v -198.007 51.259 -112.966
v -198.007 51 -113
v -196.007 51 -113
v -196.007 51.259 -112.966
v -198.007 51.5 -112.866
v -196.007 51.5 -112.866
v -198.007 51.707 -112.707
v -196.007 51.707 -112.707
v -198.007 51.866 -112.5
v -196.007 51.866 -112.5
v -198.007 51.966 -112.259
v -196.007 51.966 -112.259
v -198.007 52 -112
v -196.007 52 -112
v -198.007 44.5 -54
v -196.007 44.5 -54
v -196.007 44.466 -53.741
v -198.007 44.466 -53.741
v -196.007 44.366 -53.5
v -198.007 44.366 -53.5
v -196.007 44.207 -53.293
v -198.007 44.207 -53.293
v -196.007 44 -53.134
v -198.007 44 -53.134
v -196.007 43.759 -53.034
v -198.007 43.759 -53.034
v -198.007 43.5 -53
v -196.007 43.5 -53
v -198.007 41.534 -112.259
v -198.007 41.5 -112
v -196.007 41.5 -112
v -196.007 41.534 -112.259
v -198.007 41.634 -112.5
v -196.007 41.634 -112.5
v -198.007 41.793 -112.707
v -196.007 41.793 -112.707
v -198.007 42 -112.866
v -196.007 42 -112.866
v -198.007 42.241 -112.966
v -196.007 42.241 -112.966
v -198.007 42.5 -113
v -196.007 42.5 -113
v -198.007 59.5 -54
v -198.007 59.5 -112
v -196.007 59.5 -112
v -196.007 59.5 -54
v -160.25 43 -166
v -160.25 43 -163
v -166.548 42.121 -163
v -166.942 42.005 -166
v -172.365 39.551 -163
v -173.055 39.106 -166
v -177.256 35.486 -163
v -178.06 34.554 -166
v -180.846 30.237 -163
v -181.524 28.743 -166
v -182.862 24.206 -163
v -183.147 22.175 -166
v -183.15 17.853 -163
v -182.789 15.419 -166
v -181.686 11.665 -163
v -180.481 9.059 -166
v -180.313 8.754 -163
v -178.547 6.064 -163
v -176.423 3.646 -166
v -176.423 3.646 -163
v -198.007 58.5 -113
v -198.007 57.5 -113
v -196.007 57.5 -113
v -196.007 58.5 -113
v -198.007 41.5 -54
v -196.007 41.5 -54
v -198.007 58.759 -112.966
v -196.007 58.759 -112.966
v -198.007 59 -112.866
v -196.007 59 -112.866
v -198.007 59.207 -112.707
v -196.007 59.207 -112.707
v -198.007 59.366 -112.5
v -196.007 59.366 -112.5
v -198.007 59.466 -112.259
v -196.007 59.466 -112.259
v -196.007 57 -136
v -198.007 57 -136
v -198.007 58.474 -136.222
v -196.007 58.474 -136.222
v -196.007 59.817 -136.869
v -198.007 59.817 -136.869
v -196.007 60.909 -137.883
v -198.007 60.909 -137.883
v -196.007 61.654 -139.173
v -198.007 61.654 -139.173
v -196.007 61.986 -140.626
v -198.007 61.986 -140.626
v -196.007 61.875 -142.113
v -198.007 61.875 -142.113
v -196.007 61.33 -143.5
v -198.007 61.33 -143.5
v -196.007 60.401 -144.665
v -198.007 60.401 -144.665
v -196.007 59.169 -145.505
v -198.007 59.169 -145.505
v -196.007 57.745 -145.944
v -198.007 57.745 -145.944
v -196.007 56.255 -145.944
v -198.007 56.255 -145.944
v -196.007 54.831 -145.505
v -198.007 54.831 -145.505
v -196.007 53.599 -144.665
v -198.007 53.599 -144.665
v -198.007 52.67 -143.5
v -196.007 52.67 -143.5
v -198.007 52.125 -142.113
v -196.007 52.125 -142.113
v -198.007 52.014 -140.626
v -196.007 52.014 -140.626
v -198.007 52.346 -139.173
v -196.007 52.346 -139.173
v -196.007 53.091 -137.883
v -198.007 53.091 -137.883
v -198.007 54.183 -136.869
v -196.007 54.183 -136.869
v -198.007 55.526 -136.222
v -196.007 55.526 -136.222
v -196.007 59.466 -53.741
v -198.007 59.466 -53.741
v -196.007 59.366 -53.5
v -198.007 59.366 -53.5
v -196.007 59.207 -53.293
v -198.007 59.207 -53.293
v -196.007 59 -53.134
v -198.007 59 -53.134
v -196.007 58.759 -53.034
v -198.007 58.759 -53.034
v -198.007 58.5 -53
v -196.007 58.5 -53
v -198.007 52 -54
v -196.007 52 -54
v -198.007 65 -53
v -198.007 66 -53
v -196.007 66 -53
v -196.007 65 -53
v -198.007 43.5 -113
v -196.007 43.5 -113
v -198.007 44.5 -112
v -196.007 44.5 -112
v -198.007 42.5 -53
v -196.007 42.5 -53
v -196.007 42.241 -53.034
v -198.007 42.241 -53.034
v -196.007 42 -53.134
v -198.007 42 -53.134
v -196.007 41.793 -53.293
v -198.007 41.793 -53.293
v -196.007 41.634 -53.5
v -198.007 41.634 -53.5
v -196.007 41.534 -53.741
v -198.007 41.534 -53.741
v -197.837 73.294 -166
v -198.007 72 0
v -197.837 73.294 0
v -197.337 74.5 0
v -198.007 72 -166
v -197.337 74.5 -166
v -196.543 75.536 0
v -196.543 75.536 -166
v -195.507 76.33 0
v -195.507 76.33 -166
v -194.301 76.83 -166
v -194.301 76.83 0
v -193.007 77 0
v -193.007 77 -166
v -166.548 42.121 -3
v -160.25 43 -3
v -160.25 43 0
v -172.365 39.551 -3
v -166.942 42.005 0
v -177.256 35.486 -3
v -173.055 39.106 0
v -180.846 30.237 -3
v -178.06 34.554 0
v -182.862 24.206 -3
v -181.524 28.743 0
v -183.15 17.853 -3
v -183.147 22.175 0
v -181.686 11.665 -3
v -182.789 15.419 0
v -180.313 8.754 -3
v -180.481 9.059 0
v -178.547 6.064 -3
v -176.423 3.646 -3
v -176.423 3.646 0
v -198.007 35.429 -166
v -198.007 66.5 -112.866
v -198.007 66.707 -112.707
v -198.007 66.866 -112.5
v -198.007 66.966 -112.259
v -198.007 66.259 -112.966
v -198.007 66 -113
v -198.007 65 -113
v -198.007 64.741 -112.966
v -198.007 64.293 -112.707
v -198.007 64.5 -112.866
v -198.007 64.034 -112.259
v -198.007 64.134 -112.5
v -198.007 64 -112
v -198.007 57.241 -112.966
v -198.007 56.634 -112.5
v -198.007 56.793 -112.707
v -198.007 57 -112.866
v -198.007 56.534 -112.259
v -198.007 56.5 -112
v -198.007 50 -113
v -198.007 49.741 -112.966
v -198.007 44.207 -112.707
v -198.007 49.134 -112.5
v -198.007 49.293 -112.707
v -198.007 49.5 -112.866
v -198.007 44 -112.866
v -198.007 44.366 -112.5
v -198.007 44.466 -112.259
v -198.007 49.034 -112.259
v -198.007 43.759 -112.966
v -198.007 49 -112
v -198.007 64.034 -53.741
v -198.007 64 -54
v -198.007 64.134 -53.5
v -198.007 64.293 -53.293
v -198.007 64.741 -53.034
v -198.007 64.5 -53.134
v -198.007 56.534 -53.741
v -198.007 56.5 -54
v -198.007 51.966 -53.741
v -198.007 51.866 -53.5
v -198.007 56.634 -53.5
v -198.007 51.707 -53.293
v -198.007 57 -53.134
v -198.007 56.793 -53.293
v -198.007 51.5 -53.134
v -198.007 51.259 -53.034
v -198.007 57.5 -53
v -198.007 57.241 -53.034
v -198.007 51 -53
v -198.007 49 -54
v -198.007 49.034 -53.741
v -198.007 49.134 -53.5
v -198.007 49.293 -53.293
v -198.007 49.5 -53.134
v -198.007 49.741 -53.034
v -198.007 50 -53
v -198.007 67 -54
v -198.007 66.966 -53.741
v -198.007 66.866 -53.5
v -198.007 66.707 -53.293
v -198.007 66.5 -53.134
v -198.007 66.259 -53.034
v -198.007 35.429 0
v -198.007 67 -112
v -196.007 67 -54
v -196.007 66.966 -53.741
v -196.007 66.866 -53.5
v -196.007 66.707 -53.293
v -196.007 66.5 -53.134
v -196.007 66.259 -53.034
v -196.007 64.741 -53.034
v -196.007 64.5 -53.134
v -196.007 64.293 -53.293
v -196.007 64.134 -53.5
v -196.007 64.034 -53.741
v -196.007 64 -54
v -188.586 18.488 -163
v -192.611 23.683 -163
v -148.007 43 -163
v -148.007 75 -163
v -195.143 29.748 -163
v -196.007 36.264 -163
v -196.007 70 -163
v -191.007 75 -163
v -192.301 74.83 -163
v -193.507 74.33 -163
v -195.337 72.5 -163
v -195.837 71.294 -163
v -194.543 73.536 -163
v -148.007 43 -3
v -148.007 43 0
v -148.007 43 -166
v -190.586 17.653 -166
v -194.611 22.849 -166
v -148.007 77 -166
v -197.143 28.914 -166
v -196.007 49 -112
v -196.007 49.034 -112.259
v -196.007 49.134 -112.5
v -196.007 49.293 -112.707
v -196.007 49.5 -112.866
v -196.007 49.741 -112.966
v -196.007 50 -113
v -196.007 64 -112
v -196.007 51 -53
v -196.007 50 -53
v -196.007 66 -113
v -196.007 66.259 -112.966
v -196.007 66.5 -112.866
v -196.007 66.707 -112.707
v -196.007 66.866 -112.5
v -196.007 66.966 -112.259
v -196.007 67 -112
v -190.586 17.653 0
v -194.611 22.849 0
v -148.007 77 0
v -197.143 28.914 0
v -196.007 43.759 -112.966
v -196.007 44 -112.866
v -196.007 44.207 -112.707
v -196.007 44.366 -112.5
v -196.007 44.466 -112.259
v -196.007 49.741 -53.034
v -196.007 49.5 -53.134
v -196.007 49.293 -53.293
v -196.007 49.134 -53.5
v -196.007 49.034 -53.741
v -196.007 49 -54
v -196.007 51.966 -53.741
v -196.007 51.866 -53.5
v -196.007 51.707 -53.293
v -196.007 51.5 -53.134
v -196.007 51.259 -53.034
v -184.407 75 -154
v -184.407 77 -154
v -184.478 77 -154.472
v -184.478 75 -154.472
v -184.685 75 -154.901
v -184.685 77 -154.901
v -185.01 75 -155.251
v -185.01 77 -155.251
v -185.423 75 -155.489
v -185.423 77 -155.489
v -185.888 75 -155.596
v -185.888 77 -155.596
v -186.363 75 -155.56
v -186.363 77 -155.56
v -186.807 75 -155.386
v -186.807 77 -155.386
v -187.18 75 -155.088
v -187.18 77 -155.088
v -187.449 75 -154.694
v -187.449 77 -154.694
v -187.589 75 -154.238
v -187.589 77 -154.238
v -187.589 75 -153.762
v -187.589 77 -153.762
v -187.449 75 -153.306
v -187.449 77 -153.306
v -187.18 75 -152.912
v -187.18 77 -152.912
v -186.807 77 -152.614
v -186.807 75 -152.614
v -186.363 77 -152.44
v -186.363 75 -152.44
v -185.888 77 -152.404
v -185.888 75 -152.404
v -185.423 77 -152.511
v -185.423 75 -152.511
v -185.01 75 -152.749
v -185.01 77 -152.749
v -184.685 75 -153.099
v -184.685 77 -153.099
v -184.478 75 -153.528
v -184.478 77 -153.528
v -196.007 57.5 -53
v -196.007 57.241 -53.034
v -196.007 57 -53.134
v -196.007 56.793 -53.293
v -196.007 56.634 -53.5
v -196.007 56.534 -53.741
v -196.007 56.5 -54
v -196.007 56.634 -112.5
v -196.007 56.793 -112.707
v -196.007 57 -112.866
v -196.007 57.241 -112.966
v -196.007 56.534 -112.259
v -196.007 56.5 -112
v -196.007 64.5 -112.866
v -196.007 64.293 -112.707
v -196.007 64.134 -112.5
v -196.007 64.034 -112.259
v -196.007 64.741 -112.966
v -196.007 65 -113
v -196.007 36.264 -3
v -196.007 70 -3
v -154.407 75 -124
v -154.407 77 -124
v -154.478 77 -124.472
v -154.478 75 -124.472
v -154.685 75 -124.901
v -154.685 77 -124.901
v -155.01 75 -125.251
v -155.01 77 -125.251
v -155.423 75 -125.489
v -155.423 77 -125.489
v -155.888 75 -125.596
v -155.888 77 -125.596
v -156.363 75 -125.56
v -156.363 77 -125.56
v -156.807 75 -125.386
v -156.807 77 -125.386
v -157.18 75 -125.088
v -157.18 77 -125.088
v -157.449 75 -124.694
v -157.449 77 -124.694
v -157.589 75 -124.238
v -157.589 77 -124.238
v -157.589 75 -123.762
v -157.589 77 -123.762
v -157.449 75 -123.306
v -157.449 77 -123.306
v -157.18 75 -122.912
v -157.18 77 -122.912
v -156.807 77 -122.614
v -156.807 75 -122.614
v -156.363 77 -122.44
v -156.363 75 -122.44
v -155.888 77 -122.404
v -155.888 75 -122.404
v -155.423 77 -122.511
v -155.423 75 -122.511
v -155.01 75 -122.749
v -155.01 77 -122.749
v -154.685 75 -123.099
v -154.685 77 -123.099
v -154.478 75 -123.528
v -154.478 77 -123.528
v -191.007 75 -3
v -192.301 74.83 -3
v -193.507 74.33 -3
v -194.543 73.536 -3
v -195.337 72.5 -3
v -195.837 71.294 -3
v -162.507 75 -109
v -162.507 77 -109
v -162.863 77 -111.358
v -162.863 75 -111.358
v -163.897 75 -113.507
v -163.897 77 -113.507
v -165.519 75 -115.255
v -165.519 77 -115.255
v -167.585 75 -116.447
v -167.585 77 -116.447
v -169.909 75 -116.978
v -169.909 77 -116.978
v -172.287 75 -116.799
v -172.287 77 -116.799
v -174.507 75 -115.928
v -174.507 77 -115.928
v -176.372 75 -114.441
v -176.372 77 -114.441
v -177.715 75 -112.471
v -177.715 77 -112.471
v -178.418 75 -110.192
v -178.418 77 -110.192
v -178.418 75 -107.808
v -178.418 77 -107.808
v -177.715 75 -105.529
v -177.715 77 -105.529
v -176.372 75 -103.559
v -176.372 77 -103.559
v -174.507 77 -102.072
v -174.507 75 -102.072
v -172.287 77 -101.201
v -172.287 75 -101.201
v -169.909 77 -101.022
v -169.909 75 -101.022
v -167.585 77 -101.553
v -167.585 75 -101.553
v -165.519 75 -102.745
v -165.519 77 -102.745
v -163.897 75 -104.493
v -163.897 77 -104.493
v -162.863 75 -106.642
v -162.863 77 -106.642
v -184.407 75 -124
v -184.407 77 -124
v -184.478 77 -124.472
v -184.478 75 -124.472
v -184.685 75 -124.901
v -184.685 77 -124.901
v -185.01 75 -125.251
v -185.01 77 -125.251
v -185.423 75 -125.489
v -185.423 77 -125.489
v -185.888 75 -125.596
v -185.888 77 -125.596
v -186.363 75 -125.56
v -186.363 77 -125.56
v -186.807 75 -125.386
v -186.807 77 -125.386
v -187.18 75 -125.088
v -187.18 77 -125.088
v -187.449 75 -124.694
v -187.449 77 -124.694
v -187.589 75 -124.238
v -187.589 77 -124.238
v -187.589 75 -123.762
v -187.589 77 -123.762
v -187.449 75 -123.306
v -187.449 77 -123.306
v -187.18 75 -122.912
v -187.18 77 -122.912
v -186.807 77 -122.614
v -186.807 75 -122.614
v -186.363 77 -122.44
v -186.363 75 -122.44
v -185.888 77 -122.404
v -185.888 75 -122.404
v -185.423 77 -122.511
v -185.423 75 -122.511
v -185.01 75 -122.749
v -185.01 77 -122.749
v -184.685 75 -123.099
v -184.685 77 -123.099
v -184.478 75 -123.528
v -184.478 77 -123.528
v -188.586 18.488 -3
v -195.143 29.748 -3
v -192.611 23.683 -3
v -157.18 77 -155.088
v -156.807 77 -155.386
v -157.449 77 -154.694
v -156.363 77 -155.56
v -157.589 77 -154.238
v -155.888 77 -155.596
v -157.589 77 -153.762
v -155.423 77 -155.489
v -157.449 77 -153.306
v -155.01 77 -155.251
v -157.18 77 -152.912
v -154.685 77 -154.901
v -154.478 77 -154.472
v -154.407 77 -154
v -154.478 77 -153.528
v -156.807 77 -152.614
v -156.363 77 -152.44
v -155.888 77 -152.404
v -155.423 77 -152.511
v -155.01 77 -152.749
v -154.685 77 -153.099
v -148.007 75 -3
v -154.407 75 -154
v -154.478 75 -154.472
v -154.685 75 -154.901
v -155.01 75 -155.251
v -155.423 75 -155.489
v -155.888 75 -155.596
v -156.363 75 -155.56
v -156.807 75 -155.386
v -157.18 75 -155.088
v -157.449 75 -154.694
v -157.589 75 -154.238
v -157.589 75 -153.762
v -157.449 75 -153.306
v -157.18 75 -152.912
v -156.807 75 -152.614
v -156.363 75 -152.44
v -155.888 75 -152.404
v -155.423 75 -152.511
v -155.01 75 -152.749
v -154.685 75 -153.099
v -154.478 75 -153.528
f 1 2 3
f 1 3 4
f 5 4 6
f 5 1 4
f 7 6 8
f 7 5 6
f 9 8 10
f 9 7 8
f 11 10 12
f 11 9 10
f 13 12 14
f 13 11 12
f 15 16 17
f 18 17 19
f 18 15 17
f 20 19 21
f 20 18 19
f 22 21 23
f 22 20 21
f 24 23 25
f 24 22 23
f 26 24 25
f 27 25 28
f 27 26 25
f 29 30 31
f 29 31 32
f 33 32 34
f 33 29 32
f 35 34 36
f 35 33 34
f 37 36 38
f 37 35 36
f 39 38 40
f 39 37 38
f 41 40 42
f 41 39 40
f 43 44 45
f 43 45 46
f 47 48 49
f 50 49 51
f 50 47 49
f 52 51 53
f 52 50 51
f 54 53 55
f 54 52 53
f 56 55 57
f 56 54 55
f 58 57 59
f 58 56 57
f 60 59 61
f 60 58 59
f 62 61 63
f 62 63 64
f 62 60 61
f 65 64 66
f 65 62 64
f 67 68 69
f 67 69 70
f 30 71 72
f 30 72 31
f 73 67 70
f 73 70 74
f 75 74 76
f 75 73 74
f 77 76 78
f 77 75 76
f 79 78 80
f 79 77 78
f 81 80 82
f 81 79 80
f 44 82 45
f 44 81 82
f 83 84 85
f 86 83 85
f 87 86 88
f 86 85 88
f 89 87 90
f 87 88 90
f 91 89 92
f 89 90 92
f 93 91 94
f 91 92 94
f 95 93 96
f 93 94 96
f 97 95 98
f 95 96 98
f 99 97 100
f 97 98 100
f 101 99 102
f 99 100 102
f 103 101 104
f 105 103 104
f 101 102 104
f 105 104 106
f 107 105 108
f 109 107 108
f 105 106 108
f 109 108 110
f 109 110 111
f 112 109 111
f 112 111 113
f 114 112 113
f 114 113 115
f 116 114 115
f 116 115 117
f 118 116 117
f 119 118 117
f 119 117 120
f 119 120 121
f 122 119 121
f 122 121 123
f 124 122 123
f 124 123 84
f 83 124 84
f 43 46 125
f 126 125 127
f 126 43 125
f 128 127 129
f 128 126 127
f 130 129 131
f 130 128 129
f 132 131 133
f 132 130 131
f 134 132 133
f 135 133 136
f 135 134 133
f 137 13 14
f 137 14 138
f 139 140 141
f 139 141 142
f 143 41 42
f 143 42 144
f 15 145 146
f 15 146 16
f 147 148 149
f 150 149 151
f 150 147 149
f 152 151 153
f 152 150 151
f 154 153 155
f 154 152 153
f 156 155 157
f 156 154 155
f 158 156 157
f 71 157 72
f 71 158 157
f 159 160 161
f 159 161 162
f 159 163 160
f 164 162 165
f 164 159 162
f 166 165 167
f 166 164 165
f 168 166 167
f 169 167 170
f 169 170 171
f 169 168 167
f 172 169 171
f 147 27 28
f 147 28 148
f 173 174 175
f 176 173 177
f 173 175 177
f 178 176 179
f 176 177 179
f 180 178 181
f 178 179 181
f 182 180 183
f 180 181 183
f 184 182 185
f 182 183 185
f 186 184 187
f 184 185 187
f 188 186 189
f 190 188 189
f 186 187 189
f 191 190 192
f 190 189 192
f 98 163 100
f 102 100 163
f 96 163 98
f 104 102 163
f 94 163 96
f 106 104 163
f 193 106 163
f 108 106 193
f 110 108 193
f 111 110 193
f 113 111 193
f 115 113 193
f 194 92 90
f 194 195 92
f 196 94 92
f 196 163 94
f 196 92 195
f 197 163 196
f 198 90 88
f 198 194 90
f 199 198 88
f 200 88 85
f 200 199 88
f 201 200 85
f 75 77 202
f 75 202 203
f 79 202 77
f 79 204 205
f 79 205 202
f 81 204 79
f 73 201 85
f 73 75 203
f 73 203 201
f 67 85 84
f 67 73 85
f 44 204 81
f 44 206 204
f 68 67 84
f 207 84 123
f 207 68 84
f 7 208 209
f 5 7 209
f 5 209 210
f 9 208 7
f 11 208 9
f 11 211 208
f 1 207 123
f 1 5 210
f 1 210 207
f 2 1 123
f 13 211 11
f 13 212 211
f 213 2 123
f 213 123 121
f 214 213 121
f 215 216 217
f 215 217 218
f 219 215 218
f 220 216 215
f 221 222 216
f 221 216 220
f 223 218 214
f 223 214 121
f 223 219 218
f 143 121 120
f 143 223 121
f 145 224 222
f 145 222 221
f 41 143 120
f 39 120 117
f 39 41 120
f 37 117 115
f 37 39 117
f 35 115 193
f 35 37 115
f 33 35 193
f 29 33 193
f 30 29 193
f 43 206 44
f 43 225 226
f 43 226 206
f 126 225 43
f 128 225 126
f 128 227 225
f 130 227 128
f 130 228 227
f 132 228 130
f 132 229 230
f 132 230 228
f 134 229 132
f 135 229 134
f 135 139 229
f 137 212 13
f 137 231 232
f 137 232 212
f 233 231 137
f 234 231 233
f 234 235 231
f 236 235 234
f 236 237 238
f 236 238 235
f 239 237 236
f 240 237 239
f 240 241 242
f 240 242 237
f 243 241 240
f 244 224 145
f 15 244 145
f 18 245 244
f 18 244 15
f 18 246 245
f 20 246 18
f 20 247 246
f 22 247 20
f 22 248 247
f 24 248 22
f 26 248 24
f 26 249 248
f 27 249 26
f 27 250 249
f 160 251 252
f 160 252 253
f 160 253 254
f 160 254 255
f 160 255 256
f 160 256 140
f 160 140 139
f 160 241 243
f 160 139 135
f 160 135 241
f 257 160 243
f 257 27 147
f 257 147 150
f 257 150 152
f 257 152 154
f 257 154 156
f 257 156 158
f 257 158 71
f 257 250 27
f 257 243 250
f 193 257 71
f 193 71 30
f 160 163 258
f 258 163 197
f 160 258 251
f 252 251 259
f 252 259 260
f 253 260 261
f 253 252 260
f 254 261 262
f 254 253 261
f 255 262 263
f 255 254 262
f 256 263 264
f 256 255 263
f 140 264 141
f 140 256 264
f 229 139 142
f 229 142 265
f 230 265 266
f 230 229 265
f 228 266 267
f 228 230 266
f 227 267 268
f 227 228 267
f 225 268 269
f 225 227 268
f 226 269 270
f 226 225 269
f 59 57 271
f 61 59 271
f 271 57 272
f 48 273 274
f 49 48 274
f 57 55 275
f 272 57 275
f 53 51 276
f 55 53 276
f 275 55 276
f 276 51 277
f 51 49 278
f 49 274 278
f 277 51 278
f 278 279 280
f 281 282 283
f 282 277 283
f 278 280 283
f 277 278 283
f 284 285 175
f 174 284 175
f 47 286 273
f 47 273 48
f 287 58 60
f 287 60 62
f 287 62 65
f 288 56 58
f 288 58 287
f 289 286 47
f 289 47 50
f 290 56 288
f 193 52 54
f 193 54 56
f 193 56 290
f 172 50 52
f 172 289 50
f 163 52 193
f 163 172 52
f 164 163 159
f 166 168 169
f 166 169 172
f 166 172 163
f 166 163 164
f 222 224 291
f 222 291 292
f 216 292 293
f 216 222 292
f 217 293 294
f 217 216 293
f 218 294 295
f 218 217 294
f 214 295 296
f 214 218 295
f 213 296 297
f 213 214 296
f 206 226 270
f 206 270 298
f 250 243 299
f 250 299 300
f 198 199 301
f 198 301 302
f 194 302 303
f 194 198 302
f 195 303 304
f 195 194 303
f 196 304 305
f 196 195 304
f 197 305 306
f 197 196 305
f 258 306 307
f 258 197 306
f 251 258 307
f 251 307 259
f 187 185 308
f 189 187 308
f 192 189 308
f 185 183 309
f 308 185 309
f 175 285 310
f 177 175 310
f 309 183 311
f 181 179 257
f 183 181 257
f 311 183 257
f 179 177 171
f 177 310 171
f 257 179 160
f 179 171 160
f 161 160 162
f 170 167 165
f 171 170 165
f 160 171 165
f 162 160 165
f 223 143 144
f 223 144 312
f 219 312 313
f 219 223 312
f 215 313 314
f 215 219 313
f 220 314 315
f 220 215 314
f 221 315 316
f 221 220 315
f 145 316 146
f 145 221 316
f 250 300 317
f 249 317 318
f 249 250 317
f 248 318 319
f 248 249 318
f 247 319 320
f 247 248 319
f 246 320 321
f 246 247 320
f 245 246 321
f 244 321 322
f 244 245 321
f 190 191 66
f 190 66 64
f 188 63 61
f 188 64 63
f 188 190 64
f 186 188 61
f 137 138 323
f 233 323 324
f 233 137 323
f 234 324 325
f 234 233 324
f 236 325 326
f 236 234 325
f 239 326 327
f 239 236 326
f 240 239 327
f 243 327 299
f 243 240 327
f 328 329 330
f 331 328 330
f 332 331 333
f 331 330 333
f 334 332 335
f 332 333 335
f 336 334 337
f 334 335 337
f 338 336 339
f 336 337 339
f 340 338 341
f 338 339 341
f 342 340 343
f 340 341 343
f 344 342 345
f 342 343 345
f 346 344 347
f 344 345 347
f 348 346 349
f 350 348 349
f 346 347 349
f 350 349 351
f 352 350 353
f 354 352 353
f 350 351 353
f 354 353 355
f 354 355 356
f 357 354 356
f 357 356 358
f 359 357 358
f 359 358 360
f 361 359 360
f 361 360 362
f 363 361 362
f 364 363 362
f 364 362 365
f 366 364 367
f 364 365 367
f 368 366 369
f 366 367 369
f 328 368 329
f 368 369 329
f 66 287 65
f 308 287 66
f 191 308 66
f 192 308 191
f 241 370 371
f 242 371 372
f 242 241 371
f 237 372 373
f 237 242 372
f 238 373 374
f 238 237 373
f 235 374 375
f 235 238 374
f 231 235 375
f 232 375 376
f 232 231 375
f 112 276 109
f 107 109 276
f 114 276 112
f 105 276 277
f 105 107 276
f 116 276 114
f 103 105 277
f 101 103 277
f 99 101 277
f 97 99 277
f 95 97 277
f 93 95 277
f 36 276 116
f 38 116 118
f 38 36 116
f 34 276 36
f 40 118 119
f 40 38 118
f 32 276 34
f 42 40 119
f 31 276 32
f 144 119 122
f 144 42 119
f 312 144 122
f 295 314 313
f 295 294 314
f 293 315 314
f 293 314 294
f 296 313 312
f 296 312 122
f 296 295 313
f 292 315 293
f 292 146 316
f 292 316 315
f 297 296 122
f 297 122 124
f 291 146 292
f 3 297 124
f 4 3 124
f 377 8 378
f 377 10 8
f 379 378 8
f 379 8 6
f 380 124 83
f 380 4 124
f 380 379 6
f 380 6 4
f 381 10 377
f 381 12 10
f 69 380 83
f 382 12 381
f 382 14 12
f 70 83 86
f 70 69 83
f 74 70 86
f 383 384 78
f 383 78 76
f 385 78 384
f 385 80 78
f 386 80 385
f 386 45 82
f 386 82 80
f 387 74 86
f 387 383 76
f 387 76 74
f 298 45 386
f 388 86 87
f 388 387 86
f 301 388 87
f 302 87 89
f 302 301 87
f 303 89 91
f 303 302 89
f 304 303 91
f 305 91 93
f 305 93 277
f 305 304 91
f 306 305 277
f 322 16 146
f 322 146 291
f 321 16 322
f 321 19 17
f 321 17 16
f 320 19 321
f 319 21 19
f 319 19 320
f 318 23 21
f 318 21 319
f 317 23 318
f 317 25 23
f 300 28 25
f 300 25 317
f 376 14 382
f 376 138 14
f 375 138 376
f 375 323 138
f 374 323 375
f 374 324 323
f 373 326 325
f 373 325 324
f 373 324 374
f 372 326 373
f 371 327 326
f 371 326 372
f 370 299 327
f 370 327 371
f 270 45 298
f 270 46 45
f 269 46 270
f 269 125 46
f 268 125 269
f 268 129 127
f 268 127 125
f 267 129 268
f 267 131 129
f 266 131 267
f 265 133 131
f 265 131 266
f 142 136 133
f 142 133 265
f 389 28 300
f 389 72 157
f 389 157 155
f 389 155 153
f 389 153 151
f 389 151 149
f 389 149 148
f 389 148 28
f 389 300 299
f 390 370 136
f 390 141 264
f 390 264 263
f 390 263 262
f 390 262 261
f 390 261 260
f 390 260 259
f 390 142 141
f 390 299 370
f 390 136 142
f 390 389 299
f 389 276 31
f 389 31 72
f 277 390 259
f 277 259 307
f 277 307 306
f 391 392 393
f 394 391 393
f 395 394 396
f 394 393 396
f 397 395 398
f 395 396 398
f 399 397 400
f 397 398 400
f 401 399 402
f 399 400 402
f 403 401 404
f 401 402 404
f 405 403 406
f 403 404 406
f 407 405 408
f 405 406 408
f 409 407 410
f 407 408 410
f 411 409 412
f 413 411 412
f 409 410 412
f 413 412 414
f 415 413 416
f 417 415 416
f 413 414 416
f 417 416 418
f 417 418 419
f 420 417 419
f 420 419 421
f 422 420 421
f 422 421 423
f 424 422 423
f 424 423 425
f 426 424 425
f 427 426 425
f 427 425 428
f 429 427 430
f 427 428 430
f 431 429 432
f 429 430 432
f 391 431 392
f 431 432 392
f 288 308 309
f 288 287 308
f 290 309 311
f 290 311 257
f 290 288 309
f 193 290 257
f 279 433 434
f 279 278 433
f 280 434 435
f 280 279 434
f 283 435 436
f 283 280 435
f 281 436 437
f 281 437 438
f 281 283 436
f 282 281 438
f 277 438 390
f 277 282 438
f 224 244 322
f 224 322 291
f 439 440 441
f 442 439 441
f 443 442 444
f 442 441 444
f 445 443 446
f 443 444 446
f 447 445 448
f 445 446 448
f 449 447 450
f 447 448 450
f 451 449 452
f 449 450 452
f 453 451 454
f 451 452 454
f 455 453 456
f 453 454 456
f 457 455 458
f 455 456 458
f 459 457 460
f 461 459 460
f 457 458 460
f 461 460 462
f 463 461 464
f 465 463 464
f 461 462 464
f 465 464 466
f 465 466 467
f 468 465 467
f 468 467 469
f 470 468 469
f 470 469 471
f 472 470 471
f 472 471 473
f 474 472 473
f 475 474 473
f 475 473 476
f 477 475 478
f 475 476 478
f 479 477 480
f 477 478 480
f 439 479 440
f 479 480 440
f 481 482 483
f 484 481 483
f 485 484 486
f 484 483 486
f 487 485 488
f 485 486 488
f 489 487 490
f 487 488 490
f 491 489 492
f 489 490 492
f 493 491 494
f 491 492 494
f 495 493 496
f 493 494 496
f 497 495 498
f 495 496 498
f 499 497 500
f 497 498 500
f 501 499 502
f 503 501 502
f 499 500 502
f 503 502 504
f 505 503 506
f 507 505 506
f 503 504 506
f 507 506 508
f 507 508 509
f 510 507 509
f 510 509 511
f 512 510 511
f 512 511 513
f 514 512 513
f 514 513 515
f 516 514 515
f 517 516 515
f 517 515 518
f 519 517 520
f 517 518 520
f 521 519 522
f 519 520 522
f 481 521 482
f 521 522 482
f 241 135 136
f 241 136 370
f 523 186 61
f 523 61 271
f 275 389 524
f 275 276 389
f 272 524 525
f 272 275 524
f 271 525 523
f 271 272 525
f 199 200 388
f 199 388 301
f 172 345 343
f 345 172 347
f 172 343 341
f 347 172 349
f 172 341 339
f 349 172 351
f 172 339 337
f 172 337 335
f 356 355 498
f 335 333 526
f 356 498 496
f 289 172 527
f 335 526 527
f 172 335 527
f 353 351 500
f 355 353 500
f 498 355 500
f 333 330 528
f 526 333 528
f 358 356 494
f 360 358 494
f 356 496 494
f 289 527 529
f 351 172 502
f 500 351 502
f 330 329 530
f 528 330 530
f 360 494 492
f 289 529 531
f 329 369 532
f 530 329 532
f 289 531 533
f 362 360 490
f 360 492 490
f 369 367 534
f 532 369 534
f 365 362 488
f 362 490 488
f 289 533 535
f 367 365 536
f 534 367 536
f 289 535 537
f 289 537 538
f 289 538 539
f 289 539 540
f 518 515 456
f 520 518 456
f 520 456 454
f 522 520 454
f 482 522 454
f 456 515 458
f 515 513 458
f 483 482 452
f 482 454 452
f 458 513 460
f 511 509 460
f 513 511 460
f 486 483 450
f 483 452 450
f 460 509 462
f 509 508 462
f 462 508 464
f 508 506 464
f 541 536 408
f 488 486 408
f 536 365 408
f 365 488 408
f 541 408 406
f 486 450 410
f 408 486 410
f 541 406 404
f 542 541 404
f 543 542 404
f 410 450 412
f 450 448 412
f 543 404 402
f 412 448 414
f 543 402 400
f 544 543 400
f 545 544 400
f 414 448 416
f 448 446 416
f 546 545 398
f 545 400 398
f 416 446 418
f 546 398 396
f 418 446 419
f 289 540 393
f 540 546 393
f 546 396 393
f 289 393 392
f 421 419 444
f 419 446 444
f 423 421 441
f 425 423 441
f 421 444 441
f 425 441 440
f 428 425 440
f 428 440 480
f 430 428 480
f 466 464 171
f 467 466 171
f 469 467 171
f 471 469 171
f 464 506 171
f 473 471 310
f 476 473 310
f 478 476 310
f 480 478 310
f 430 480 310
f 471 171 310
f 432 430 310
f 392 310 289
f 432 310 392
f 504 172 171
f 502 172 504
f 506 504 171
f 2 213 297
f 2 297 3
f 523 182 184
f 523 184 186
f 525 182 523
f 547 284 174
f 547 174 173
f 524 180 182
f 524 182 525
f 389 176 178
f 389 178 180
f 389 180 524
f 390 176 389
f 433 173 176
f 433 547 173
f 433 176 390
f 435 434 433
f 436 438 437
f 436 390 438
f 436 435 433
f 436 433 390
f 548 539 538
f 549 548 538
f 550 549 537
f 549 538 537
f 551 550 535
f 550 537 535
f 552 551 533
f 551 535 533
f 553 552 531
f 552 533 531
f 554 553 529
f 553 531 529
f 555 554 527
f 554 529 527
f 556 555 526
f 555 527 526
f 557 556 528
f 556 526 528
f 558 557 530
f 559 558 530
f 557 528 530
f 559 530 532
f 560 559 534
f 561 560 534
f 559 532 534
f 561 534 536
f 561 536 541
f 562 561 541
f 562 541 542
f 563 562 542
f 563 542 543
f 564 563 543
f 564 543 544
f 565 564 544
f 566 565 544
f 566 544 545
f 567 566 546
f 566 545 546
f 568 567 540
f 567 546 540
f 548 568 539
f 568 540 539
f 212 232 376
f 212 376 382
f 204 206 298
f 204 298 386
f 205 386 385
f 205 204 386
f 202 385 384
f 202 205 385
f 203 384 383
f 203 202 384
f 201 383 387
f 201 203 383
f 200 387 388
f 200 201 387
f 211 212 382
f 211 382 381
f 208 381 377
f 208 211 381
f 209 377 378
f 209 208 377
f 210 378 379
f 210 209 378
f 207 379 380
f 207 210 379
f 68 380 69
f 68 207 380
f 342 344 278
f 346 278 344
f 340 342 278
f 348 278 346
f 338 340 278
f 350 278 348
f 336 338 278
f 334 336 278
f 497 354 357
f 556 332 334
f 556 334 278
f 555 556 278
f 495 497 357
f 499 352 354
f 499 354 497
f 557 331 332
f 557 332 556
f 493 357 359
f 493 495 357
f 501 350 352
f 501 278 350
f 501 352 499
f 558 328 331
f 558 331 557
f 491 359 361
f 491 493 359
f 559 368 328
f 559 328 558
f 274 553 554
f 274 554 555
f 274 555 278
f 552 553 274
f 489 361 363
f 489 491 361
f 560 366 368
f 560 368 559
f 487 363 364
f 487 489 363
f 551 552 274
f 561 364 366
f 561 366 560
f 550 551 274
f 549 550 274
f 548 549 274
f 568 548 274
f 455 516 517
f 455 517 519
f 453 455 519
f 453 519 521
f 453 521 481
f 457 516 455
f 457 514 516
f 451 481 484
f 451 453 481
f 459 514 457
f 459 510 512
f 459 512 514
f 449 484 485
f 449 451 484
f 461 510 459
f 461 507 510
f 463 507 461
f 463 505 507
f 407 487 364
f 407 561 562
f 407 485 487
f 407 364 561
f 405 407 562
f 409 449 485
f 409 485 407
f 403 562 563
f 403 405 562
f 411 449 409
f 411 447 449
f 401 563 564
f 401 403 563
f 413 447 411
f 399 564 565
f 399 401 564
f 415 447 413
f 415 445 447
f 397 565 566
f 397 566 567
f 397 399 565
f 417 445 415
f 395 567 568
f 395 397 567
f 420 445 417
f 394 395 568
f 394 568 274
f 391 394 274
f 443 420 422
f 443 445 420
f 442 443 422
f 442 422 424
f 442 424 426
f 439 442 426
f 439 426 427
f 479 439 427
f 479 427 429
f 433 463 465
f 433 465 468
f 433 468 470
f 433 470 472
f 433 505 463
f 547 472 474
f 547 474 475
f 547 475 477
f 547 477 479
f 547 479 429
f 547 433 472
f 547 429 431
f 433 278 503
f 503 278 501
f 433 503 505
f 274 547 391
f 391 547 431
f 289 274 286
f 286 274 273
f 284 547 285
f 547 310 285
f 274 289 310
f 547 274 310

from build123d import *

# Parameters (mm, degrees)
BOSS_EXTRUDE1_DEPTH = 3
BOSS_EXTRUDE2_DEPTH = 3
BOSS_EXTRUDE3_DEPTH = 160
FILLET1_R           = 5
FILLET2_R           = 25
CUT_EXTRUDE1_DEPTH  = 5
SKETCH5_R           = 8
CUT_EXTRUDE2_DEPTH  = 2
SKETCH6_R           = 1.6
CUT_EXTRUDE3_DEPTH  = 2
SKETCH7_R           = 5
CUT_EXTRUDE4_DEPTH  = 3


with BuildPart() as part:
    # Sketch1 → Boss-Extrude1 (new body)
    with BuildSketch(Plane.XY):
        with BuildLine():
            Line((-176.422637822, 3.646230224), (-198.007283518, 24.991807553))
            Line((-198.007283518, 24.991807553), (-198.007283518, 77))
            Line((-198.007283518, 77), (-148.007283518, 77))
            Line((-148.007283518, 77), (-148.007283518, 43))
            Line((-148.007283518, 43), (-160.25, 43))
            ThreePointArc((-160.25, 43), (-181.523653951, 28.742519521), (-176.422637822, 3.646230224))
        make_face()
    extrude(amount=-BOSS_EXTRUDE1_DEPTH)



with BuildPart() as body_2:
    # Sketch2 → Boss-Extrude2 (new body)
    with BuildSketch(Plane(origin=(0, 0, -166), x_dir=(-1, 0, 0), z_dir=(0, 0, -1))):
        with BuildLine():
            Line((198.007283518, 24.991807553), (198.007283518, 77))
            Line((198.007283518, 77), (148.007283518, 77))
            Line((148.007283518, 77), (148.007283518, 43))
            Line((148.007283518, 43), (160.25, 43))
            ThreePointArc((160.25, 43), (181.523653951, 28.742519521), (176.422637822, 3.646230224))
            Line((176.422637822, 3.646230224), (198.007283518, 24.991807553))
        make_face()
    extrude(amount=-BOSS_EXTRUDE2_DEPTH)


with BuildPart() as part_1:
    add(part.part)

    add(body_2.part)  # Boss-Extrude3 merges body 2
    # Sketch3 → Boss-Extrude3 (add)
    with BuildSketch(Plane(origin=(0, 0, -3), x_dir=(-1, 0, 0), z_dir=(0, 0, -1))):
        with BuildLine():
            Line((181.686406663, 11.66450545), (196.007283518, 25.826766376))
            Line((196.007283518, 25.826766376), (196.007283518, 75))
            Line((196.007283518, 75), (148.007283518, 75))
            Line((148.007283518, 75), (148.007283518, 77))
            Line((148.007283518, 77), (198.007283518, 77))
            Line((198.007283518, 77), (198.007283518, 24.991807553))
            Line((198.007283518, 24.991807553), (176.422637822, 3.646230224))
            ThreePointArc((176.422637822, 3.646230224), (179.477148545, 7.377925731), (181.686406663, 11.66450545))
        make_face()
    extrude(amount=BOSS_EXTRUDE3_DEPTH)

    # Fillet1
    fillet1_edges = [part_1.edges().sort_by_distance(p)[0] for p in [
        (-198.007283518, 77, -83),
        (-196.007283518, 75, -83),
    ]]
    fillet(fillet1_edges, radius=FILLET1_R)

    # Fillet2
    fillet2_edges = [part_1.edges().sort_by_distance(p)[0] for p in [
        (-198.007283518, 24.991807553, -83),
        (-196.007283518, 25.826766376, -83),
    ]]
    fillet(fillet2_edges, radius=FILLET2_R)

    # Sketch4 → Cut-Extrude1 (cut)
    with BuildSketch(Plane.ZY.offset(198.007283518)):
        with BuildLine():
            Line((-112, 59.5), (-54, 59.5))
            ThreePointArc((-54, 59.5), (-53.292893219, 59.207106781), (-53, 58.5))
            Line((-53, 58.5), (-53, 57.5))
            ThreePointArc((-53, 57.5), (-53.292893219, 56.792893219), (-54, 56.5))
            Line((-54, 56.5), (-112, 56.5))
            ThreePointArc((-112, 56.5), (-112.707106781, 56.792893219), (-113, 57.5))
            Line((-113, 57.5), (-113, 58.5))
            ThreePointArc((-113, 58.5), (-112.707106781, 59.207106781), (-112, 59.5))
        make_face()
        with BuildLine():
            Line((-112, 67), (-54, 67))
            ThreePointArc((-54, 67), (-53.292893219, 66.707106781), (-53, 66))
            Line((-53, 66), (-53, 65))
            ThreePointArc((-53, 65), (-53.292893219, 64.292893219), (-54, 64))
            Line((-54, 64), (-112, 64))
            ThreePointArc((-112, 64), (-112.707106781, 64.292893219), (-113, 65))
            Line((-113, 65), (-113, 66))
            ThreePointArc((-113, 66), (-112.707106781, 66.707106781), (-112, 67))
        make_face()
        with BuildLine():
            Line((-112, 52), (-54, 52))
            ThreePointArc((-54, 52), (-53.292893219, 51.707106781), (-53, 51))
            Line((-53, 51), (-53, 50))
            ThreePointArc((-53, 50), (-53.292893219, 49.292893219), (-54, 49))
            Line((-54, 49), (-112, 49))
            ThreePointArc((-112, 49), (-112.707106781, 49.292893219), (-113, 50))
            Line((-113, 50), (-113, 51))
            ThreePointArc((-113, 51), (-112.707106781, 51.707106781), (-112, 52))
        make_face()
        with BuildLine():
            Line((-112, 44.5), (-54, 44.5))
            ThreePointArc((-54, 44.5), (-53.292893219, 44.207106781), (-53, 43.5))
            Line((-53, 43.5), (-53, 42.5))
            ThreePointArc((-53, 42.5), (-53.292893219, 41.792893219), (-54, 41.5))
            Line((-54, 41.5), (-112, 41.5))
            ThreePointArc((-112, 41.5), (-112.707106781, 41.792893219), (-113, 42.5))
            Line((-113, 42.5), (-113, 43.5))
            ThreePointArc((-113, 43.5), (-112.707106781, 44.207106781), (-112, 44.5))
        make_face()
    extrude(amount=-CUT_EXTRUDE1_DEPTH, mode=Mode.SUBTRACT)

    # Sketch5 → Cut-Extrude2 (cut)
    with BuildSketch(Plane(origin=(0, 77, 0), x_dir=(1, 0, 0), z_dir=(0, 1, 0))):
        with Locations((-170.507283518, 109)):
            Circle(SKETCH5_R)
    extrude(amount=-CUT_EXTRUDE2_DEPTH, mode=Mode.SUBTRACT)

    # Sketch6 → Cut-Extrude3 (cut)
    with BuildSketch(Plane(origin=(0, 77, 0), x_dir=(1, 0, 0), z_dir=(0, 1, 0))):
        with Locations((-156.007283518, 154)):
            Circle(SKETCH6_R)
        with Locations((-156.007283518, 124)):
            Circle(SKETCH6_R)
        with Locations((-186.007283518, 124)):
            Circle(SKETCH6_R)
        with Locations((-186.007283518, 154)):
            Circle(SKETCH6_R)
    extrude(amount=-CUT_EXTRUDE3_DEPTH, mode=Mode.SUBTRACT)

    # Sketch7 → Cut-Extrude4 (cut)
    with BuildSketch(Plane.ZY.offset(198.007283518)):
        with Locations((-141, 57)):
            Circle(SKETCH7_R)
    extrude(amount=-CUT_EXTRUDE4_DEPTH, mode=Mode.SUBTRACT)


solid = part_1.part
